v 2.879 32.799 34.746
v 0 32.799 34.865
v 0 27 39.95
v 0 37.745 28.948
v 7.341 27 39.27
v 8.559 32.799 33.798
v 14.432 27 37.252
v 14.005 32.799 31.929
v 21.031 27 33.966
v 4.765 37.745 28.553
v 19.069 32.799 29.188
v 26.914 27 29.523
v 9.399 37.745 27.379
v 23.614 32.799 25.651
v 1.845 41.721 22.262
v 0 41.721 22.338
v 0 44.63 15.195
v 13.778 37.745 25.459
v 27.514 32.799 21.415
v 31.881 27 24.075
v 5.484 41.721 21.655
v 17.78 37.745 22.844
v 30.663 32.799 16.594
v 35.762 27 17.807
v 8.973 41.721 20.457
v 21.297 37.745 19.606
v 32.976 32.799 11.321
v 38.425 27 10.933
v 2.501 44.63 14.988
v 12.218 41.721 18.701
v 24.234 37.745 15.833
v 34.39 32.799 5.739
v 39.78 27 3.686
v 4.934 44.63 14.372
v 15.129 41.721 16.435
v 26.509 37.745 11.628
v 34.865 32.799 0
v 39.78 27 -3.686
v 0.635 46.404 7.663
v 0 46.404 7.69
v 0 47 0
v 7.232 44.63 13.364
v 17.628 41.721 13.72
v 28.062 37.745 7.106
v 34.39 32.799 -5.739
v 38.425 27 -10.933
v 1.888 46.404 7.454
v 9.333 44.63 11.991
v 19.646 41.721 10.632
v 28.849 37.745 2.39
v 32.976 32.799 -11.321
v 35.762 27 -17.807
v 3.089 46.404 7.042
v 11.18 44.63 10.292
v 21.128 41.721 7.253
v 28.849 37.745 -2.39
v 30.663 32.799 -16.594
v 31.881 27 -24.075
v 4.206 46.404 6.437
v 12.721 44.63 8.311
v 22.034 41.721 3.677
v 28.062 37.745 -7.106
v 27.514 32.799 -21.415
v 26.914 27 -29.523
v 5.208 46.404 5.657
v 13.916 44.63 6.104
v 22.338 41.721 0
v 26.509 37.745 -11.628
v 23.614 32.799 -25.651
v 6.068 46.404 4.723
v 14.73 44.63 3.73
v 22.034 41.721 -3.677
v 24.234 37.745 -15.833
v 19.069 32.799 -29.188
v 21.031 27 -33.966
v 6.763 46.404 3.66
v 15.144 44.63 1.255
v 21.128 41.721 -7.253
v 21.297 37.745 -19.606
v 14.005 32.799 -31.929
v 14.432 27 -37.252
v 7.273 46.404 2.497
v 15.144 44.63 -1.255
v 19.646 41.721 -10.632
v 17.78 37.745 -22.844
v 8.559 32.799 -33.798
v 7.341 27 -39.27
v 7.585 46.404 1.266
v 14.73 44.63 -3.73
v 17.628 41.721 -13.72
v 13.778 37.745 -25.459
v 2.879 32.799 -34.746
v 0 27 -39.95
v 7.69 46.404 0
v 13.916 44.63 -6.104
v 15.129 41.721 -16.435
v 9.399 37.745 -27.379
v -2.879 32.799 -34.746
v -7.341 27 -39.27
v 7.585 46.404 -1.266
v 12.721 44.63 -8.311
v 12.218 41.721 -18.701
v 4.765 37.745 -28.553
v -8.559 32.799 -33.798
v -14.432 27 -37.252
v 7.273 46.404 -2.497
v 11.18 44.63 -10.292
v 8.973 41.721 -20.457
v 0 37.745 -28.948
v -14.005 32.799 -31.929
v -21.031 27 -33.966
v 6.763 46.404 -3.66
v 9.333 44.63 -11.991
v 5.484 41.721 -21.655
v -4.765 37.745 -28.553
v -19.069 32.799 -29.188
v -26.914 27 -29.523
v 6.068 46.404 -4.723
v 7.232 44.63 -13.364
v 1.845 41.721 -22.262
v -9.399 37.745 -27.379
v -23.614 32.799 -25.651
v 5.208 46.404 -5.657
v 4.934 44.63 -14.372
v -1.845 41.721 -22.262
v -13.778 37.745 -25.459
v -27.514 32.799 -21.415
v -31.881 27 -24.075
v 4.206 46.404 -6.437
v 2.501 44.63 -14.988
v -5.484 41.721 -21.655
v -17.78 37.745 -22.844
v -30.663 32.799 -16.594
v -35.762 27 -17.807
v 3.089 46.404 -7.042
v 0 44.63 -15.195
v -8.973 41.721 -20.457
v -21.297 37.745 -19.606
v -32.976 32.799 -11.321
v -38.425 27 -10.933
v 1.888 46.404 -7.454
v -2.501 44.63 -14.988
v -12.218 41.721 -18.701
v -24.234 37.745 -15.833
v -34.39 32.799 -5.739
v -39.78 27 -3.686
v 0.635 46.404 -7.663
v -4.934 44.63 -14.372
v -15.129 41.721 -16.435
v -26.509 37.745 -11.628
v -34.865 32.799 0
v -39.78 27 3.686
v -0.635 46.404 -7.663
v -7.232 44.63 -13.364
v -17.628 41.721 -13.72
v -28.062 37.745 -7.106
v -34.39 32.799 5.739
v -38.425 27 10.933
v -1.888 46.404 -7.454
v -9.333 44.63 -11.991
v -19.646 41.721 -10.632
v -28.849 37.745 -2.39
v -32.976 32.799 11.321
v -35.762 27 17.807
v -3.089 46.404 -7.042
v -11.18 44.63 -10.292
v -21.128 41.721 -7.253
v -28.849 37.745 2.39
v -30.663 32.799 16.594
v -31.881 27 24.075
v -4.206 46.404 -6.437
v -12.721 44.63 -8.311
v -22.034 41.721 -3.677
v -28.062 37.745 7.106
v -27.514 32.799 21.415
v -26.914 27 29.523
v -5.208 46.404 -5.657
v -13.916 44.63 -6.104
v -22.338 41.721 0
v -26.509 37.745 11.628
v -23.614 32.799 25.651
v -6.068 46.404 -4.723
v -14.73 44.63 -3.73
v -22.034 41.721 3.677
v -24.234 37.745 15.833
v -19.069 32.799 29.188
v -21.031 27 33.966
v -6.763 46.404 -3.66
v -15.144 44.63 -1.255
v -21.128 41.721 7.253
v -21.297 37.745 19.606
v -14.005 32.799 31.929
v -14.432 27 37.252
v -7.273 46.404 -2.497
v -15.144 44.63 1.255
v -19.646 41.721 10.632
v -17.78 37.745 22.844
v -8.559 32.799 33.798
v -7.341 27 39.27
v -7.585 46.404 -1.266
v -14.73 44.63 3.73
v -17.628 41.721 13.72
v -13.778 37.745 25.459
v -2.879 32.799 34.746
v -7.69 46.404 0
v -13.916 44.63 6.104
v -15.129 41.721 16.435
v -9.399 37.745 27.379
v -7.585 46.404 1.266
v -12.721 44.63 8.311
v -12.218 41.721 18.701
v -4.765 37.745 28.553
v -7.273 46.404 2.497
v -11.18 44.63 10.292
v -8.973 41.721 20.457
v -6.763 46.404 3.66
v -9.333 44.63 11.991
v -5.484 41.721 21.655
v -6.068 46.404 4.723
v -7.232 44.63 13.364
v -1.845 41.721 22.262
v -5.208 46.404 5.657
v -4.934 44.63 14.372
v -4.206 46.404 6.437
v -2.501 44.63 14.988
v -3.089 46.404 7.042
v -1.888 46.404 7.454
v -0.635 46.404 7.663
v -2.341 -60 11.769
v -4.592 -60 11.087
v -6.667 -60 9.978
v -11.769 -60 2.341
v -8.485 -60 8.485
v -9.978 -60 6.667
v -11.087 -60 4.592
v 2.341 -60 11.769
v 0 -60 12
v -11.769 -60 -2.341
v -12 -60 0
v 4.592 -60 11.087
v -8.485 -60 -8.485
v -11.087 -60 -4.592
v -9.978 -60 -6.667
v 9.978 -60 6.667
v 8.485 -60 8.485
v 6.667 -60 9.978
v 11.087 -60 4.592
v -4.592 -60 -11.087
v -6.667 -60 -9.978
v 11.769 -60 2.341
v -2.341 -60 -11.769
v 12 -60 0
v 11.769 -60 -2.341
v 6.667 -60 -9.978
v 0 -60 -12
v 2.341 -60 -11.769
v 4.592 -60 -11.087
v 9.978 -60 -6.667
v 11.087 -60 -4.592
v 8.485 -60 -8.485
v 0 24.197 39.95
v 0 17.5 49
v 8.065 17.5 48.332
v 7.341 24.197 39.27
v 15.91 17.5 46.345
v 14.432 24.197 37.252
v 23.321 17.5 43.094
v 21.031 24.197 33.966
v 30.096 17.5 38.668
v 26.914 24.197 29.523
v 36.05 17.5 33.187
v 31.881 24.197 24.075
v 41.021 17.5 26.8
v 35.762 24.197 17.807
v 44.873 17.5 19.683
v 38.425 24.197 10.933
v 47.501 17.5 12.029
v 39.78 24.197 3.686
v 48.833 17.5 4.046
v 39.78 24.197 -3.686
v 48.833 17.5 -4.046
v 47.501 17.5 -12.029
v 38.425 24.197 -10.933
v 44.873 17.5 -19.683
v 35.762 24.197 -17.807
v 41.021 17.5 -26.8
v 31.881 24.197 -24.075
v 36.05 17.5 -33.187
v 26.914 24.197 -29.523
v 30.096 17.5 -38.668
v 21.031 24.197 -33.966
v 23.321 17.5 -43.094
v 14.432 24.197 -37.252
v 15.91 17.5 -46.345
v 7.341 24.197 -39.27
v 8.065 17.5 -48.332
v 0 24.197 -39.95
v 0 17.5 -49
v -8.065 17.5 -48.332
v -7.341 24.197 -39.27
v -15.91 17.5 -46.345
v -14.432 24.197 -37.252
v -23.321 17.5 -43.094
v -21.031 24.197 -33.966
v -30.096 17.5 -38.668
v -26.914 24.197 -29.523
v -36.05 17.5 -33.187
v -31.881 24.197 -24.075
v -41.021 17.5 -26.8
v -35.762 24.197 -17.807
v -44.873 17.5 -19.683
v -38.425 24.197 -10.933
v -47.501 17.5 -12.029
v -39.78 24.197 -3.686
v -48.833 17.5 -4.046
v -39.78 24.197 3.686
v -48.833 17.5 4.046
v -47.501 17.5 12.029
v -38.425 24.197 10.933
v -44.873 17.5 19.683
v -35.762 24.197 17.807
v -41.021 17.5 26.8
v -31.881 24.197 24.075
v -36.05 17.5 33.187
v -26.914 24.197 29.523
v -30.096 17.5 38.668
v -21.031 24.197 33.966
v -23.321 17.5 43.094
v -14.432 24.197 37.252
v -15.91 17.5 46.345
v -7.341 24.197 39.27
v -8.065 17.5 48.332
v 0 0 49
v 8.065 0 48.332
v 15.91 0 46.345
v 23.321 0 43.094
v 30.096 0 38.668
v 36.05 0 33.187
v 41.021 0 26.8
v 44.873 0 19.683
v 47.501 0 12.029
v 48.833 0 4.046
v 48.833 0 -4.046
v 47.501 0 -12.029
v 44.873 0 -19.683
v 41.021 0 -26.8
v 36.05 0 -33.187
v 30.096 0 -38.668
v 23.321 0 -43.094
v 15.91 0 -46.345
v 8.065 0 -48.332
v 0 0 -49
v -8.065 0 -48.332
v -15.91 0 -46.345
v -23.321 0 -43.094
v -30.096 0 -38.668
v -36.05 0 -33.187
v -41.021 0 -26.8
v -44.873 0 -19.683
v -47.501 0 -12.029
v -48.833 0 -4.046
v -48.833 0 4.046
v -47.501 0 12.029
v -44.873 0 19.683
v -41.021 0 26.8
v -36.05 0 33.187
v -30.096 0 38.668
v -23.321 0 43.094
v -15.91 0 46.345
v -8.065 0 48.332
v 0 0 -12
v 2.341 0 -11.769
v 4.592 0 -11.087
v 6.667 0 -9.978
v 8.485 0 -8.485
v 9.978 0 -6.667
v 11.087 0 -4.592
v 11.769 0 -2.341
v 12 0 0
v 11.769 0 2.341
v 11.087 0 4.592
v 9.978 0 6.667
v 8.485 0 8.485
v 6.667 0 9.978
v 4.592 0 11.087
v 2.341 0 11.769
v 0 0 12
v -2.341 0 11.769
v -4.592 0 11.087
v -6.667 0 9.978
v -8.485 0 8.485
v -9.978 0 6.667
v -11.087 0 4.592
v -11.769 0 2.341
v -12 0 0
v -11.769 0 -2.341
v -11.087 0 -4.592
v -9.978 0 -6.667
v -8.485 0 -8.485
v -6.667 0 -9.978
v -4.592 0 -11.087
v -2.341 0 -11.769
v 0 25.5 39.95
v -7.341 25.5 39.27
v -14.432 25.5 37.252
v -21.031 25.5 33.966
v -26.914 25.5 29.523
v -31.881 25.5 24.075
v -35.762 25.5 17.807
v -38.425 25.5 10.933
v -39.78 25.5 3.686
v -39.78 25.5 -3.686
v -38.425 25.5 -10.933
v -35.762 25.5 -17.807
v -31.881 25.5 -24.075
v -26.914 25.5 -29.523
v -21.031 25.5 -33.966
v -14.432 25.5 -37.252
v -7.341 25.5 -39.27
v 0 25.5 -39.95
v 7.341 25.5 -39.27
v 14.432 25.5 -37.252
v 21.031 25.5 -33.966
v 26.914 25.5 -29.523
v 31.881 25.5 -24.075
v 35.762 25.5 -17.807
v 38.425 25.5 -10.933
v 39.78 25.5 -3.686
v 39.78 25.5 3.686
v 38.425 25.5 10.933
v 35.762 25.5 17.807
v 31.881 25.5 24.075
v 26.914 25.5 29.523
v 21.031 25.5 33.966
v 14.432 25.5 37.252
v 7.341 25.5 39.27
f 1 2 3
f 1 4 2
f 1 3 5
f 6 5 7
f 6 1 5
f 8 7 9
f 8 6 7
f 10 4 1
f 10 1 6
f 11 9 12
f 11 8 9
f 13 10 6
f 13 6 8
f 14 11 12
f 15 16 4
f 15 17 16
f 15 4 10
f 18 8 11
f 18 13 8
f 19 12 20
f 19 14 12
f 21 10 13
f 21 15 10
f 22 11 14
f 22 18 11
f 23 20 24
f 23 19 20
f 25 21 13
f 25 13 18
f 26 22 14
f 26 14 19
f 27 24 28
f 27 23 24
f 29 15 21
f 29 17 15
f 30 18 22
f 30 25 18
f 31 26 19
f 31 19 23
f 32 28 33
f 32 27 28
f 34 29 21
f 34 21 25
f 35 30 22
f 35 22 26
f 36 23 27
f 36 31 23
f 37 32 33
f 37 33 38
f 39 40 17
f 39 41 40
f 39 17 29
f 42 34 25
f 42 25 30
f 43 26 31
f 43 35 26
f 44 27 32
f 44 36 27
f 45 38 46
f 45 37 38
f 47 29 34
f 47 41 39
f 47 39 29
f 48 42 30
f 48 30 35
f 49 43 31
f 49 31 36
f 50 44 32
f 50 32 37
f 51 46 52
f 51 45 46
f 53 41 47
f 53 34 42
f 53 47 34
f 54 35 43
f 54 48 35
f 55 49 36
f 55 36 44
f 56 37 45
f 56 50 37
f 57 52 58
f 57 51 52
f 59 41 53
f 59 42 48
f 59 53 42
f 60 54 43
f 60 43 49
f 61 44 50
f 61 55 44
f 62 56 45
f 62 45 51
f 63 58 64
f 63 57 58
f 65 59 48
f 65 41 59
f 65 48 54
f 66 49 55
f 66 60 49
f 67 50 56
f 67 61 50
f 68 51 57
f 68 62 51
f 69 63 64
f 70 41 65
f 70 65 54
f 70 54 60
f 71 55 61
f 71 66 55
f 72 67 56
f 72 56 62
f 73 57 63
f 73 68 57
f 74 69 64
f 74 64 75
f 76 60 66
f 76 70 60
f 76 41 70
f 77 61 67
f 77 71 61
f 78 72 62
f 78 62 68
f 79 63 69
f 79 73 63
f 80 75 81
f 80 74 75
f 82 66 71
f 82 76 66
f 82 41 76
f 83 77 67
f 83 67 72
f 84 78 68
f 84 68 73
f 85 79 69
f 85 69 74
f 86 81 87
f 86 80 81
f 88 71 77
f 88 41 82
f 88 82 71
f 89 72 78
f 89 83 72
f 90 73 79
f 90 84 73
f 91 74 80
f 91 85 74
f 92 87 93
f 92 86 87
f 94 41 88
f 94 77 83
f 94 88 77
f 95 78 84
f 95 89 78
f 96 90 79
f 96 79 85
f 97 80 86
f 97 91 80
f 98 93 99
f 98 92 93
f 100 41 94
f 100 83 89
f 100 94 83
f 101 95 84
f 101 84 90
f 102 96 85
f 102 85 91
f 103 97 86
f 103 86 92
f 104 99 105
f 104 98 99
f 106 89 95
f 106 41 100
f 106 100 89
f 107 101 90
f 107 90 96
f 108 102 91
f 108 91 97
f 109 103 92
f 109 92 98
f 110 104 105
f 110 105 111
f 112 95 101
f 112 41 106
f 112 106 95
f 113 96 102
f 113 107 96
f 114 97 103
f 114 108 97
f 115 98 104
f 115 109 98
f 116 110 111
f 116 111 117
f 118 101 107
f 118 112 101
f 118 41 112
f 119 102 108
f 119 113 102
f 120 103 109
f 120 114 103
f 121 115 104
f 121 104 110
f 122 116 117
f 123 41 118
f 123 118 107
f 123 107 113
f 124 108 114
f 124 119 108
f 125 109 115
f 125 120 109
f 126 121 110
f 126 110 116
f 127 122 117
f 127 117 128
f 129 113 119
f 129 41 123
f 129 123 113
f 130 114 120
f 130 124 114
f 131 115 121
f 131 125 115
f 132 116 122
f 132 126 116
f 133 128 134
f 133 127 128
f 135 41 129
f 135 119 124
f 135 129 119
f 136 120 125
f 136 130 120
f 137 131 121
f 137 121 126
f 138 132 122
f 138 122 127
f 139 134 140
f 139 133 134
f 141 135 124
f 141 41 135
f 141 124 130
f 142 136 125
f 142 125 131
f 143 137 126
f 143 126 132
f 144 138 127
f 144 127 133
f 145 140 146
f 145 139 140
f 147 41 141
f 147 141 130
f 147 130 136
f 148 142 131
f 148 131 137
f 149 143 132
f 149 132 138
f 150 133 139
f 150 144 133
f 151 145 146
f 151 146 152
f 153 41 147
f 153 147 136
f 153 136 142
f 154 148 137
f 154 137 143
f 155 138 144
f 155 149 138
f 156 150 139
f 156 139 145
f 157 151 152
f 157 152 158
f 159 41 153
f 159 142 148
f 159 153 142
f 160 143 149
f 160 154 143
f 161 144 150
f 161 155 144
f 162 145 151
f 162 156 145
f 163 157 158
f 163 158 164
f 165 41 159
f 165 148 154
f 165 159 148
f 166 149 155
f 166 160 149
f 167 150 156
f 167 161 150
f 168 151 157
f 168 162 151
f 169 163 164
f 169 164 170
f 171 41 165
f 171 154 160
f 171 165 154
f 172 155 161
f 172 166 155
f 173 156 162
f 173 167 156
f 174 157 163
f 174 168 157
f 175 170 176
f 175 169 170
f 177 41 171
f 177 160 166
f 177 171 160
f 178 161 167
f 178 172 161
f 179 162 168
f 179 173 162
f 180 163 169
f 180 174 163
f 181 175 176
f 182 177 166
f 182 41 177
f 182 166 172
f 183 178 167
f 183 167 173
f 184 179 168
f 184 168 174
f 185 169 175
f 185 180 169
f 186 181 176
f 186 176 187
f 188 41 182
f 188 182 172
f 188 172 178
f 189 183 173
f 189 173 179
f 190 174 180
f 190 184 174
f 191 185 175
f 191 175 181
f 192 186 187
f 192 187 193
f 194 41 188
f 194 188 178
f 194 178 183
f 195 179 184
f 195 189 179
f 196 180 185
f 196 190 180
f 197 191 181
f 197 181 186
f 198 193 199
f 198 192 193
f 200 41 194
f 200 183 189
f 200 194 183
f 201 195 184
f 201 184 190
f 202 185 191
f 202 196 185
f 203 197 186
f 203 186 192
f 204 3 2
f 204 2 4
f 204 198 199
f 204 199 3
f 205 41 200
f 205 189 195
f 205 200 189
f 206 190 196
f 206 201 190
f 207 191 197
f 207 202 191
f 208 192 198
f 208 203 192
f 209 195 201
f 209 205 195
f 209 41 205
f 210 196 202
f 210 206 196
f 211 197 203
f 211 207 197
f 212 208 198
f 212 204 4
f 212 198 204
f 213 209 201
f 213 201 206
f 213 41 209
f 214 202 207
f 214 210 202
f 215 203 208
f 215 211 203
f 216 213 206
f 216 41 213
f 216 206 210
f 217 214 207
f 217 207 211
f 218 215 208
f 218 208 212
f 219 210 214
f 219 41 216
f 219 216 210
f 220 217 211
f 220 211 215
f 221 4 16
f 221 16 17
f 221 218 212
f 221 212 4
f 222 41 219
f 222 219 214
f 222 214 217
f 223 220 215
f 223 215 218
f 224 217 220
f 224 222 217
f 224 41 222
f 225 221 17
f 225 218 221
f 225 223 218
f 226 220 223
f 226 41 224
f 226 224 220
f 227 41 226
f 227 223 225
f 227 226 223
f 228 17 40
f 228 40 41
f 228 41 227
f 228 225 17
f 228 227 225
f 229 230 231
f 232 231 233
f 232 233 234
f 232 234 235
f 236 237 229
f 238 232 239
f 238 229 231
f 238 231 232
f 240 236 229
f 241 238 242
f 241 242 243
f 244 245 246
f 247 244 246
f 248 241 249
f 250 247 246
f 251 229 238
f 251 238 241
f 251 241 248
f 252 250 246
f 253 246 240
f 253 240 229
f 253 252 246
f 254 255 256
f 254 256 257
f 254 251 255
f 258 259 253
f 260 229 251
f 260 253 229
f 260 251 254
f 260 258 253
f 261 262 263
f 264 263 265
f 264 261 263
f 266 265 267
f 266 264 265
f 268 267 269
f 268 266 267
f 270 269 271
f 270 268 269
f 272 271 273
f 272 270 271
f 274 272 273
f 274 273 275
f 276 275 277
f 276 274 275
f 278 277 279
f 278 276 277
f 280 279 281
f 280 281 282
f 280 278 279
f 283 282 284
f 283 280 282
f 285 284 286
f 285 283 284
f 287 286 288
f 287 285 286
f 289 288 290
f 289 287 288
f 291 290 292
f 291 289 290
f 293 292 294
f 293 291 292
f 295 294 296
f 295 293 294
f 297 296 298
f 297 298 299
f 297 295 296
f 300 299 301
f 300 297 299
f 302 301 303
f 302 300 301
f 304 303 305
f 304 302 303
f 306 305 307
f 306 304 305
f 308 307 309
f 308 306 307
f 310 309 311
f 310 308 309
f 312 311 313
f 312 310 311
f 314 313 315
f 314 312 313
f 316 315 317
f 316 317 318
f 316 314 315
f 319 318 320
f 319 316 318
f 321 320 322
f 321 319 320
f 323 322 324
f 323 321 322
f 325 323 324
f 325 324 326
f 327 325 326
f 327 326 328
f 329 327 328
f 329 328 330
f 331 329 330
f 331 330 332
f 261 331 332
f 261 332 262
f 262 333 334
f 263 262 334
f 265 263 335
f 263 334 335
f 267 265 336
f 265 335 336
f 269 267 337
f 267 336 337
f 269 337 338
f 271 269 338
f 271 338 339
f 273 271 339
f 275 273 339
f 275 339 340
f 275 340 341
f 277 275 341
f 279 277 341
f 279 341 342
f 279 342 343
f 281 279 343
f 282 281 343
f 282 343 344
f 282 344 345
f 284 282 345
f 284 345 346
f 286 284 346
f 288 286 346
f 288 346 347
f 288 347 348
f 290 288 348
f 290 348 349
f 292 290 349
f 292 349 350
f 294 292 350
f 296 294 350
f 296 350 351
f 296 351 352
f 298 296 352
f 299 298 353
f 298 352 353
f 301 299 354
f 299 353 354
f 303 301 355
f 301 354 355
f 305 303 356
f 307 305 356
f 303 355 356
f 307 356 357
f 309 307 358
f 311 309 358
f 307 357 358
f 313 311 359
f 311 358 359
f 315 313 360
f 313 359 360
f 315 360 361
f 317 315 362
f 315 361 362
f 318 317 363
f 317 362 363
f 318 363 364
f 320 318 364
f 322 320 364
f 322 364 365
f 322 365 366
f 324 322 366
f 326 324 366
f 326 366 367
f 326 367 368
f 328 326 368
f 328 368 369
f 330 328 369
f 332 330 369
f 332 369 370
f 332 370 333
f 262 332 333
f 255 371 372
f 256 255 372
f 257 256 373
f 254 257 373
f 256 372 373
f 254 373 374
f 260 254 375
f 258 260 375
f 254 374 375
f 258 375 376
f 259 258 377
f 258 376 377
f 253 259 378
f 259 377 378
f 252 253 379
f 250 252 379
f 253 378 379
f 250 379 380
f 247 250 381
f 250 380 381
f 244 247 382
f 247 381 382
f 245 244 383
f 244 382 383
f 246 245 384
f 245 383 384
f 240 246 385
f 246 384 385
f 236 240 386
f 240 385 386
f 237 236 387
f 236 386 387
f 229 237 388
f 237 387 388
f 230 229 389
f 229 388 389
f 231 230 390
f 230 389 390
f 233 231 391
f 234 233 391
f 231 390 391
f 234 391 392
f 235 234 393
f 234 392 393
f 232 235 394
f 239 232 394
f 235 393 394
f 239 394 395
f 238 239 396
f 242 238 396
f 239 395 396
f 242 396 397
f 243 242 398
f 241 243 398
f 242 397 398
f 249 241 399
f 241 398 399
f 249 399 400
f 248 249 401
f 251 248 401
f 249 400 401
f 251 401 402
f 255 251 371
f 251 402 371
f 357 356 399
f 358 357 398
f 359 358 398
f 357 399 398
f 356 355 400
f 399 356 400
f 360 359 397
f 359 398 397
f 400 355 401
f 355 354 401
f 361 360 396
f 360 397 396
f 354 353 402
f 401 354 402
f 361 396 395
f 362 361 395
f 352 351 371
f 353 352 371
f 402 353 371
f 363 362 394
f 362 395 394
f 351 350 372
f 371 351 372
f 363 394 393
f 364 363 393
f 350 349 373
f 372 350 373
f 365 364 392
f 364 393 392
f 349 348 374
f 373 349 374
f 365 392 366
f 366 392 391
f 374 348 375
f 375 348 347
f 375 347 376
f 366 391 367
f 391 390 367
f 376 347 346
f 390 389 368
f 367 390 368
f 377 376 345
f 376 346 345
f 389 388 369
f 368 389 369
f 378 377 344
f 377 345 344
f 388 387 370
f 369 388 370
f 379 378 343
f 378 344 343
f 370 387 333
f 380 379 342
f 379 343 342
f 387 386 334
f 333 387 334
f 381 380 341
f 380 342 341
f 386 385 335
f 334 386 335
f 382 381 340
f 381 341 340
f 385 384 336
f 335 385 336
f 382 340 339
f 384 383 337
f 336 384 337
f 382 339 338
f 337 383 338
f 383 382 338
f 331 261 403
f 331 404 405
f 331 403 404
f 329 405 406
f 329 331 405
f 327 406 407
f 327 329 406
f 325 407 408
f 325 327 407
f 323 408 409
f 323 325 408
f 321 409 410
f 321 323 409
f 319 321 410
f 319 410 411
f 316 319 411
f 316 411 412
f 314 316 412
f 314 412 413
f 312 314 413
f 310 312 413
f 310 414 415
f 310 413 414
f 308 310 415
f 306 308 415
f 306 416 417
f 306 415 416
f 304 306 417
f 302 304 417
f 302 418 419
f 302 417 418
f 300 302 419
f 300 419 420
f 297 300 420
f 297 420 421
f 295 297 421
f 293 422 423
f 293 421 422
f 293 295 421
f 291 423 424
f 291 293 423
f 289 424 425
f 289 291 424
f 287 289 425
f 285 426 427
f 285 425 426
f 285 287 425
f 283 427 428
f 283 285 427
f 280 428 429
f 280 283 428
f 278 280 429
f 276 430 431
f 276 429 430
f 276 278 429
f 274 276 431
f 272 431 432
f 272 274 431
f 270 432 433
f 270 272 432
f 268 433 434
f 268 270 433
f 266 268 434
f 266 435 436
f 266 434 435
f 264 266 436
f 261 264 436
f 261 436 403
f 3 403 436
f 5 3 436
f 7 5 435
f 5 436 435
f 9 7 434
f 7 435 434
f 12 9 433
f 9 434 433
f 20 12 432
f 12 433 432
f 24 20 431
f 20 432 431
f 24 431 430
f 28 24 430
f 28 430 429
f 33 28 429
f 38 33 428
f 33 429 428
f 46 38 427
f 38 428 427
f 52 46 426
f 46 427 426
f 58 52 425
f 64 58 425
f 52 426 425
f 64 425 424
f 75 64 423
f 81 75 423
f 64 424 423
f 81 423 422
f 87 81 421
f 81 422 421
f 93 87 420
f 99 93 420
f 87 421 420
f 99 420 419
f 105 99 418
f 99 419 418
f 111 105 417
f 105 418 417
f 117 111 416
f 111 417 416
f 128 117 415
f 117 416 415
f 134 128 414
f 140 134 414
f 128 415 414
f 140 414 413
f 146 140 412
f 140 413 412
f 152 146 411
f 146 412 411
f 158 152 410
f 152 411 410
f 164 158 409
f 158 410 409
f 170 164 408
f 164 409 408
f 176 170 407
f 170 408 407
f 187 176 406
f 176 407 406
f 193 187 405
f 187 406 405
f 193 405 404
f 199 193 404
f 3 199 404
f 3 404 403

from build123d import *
from build123d.topology import SkipClean

# Parameters (mm, degrees)
SKETCH1_R           = 49
BOSS_EXTRUDE1_DEPTH = 25.5
SKETCH2_R           = 39.95
BOSS_EXTRUDE2_DEPTH = 1.5
DOME1_FACE_RADIUS   = 39.95
DOME1_HEIGHT        = 20
CHAMFER1_SIZE       = 8
CHAMFER1_SIZE_2     = 10.811379504
SKETCH3_R           = 12
BOSS_EXTRUDE3_DEPTH = 60


with BuildPart() as part:
    # Sketch1 → Boss-Extrude1 (new body)
    with BuildSketch(Plane(origin=(0, 0, 0), x_dir=(1, 0, 0), z_dir=(0, 1, 0))):
        with Locations(Location((0, 0, 0), (0, 0, 270))):
            Circle(SKETCH1_R)
    extrude(amount=BOSS_EXTRUDE1_DEPTH)

    # Sketch2 → Boss-Extrude2 (add)
    with BuildSketch(Plane(origin=(0, 25.5, 0), x_dir=(1, 0, 0), z_dir=(0, 1, 0))):
        with Locations(Location((0, 0, 0), (0, 0, 270))):
            Circle(SKETCH2_R)
    extrude(amount=BOSS_EXTRUDE2_DEPTH)

    # Dome1: a dome of height H over a round flat face of radius A is a cap of a sphere of radius (A * A + H * H) / (2 * H)
    dome1_r = (DOME1_FACE_RADIUS * DOME1_FACE_RADIUS + DOME1_HEIGHT * DOME1_HEIGHT) / (2 * DOME1_HEIGHT)
    dome1_base = Plane((0, 27, 0), z_dir=(0, 1, 0))
    with Locations(dome1_base.offset(DOME1_HEIGHT - dome1_r)):
        dome1_ball = Sphere(dome1_r, mode=Mode.PRIVATE)
    add(split(dome1_ball, bisect_by=dome1_base, keep=Keep.TOP, mode=Mode.PRIVATE))

    # Chamfer1
    # the kernel refuses this chamfer: 10.811379504, 8 mm, written as the material it takes off along each edge
    with BuildSketch(Plane(origin=(0, 25.5, 0), x_dir=(0, 0, 1), z_dir=(-1, 0, 0))) as chamfer1_piece_1_section:
        Polygon((49, -CHAMFER1_SIZE), (49 - CHAMFER1_SIZE_2, 0), (49, 0), align=None)
    chamfer1_piece_1 = revolve(axis=Axis((0, 25.5, 0), (0, 1, 0)), mode=Mode.PRIVATE)
    chamfer1_piece_1 = chamfer1_piece_1 - Plane(origin=(0, 20.910194106, 0), x_dir=(0, 0, 1), z_dir=(0, -1, 0)) * Cylinder(39.95, 196, mode=Mode.PRIVATE)
    add(chamfer1_piece_1, mode=Mode.SUBTRACT)

    # Sketch3 → Boss-Extrude3 (add)
    with SkipClean():  # the faces are left unmerged after this step: merging them gives an invalid solid
        with BuildSketch(Plane.XZ):
            with Locations(Location((0, 0, 0), (0, 0, 270))):
                Circle(SKETCH3_R)
        extrude(amount=BOSS_EXTRUDE3_DEPTH)


solid = part.part
